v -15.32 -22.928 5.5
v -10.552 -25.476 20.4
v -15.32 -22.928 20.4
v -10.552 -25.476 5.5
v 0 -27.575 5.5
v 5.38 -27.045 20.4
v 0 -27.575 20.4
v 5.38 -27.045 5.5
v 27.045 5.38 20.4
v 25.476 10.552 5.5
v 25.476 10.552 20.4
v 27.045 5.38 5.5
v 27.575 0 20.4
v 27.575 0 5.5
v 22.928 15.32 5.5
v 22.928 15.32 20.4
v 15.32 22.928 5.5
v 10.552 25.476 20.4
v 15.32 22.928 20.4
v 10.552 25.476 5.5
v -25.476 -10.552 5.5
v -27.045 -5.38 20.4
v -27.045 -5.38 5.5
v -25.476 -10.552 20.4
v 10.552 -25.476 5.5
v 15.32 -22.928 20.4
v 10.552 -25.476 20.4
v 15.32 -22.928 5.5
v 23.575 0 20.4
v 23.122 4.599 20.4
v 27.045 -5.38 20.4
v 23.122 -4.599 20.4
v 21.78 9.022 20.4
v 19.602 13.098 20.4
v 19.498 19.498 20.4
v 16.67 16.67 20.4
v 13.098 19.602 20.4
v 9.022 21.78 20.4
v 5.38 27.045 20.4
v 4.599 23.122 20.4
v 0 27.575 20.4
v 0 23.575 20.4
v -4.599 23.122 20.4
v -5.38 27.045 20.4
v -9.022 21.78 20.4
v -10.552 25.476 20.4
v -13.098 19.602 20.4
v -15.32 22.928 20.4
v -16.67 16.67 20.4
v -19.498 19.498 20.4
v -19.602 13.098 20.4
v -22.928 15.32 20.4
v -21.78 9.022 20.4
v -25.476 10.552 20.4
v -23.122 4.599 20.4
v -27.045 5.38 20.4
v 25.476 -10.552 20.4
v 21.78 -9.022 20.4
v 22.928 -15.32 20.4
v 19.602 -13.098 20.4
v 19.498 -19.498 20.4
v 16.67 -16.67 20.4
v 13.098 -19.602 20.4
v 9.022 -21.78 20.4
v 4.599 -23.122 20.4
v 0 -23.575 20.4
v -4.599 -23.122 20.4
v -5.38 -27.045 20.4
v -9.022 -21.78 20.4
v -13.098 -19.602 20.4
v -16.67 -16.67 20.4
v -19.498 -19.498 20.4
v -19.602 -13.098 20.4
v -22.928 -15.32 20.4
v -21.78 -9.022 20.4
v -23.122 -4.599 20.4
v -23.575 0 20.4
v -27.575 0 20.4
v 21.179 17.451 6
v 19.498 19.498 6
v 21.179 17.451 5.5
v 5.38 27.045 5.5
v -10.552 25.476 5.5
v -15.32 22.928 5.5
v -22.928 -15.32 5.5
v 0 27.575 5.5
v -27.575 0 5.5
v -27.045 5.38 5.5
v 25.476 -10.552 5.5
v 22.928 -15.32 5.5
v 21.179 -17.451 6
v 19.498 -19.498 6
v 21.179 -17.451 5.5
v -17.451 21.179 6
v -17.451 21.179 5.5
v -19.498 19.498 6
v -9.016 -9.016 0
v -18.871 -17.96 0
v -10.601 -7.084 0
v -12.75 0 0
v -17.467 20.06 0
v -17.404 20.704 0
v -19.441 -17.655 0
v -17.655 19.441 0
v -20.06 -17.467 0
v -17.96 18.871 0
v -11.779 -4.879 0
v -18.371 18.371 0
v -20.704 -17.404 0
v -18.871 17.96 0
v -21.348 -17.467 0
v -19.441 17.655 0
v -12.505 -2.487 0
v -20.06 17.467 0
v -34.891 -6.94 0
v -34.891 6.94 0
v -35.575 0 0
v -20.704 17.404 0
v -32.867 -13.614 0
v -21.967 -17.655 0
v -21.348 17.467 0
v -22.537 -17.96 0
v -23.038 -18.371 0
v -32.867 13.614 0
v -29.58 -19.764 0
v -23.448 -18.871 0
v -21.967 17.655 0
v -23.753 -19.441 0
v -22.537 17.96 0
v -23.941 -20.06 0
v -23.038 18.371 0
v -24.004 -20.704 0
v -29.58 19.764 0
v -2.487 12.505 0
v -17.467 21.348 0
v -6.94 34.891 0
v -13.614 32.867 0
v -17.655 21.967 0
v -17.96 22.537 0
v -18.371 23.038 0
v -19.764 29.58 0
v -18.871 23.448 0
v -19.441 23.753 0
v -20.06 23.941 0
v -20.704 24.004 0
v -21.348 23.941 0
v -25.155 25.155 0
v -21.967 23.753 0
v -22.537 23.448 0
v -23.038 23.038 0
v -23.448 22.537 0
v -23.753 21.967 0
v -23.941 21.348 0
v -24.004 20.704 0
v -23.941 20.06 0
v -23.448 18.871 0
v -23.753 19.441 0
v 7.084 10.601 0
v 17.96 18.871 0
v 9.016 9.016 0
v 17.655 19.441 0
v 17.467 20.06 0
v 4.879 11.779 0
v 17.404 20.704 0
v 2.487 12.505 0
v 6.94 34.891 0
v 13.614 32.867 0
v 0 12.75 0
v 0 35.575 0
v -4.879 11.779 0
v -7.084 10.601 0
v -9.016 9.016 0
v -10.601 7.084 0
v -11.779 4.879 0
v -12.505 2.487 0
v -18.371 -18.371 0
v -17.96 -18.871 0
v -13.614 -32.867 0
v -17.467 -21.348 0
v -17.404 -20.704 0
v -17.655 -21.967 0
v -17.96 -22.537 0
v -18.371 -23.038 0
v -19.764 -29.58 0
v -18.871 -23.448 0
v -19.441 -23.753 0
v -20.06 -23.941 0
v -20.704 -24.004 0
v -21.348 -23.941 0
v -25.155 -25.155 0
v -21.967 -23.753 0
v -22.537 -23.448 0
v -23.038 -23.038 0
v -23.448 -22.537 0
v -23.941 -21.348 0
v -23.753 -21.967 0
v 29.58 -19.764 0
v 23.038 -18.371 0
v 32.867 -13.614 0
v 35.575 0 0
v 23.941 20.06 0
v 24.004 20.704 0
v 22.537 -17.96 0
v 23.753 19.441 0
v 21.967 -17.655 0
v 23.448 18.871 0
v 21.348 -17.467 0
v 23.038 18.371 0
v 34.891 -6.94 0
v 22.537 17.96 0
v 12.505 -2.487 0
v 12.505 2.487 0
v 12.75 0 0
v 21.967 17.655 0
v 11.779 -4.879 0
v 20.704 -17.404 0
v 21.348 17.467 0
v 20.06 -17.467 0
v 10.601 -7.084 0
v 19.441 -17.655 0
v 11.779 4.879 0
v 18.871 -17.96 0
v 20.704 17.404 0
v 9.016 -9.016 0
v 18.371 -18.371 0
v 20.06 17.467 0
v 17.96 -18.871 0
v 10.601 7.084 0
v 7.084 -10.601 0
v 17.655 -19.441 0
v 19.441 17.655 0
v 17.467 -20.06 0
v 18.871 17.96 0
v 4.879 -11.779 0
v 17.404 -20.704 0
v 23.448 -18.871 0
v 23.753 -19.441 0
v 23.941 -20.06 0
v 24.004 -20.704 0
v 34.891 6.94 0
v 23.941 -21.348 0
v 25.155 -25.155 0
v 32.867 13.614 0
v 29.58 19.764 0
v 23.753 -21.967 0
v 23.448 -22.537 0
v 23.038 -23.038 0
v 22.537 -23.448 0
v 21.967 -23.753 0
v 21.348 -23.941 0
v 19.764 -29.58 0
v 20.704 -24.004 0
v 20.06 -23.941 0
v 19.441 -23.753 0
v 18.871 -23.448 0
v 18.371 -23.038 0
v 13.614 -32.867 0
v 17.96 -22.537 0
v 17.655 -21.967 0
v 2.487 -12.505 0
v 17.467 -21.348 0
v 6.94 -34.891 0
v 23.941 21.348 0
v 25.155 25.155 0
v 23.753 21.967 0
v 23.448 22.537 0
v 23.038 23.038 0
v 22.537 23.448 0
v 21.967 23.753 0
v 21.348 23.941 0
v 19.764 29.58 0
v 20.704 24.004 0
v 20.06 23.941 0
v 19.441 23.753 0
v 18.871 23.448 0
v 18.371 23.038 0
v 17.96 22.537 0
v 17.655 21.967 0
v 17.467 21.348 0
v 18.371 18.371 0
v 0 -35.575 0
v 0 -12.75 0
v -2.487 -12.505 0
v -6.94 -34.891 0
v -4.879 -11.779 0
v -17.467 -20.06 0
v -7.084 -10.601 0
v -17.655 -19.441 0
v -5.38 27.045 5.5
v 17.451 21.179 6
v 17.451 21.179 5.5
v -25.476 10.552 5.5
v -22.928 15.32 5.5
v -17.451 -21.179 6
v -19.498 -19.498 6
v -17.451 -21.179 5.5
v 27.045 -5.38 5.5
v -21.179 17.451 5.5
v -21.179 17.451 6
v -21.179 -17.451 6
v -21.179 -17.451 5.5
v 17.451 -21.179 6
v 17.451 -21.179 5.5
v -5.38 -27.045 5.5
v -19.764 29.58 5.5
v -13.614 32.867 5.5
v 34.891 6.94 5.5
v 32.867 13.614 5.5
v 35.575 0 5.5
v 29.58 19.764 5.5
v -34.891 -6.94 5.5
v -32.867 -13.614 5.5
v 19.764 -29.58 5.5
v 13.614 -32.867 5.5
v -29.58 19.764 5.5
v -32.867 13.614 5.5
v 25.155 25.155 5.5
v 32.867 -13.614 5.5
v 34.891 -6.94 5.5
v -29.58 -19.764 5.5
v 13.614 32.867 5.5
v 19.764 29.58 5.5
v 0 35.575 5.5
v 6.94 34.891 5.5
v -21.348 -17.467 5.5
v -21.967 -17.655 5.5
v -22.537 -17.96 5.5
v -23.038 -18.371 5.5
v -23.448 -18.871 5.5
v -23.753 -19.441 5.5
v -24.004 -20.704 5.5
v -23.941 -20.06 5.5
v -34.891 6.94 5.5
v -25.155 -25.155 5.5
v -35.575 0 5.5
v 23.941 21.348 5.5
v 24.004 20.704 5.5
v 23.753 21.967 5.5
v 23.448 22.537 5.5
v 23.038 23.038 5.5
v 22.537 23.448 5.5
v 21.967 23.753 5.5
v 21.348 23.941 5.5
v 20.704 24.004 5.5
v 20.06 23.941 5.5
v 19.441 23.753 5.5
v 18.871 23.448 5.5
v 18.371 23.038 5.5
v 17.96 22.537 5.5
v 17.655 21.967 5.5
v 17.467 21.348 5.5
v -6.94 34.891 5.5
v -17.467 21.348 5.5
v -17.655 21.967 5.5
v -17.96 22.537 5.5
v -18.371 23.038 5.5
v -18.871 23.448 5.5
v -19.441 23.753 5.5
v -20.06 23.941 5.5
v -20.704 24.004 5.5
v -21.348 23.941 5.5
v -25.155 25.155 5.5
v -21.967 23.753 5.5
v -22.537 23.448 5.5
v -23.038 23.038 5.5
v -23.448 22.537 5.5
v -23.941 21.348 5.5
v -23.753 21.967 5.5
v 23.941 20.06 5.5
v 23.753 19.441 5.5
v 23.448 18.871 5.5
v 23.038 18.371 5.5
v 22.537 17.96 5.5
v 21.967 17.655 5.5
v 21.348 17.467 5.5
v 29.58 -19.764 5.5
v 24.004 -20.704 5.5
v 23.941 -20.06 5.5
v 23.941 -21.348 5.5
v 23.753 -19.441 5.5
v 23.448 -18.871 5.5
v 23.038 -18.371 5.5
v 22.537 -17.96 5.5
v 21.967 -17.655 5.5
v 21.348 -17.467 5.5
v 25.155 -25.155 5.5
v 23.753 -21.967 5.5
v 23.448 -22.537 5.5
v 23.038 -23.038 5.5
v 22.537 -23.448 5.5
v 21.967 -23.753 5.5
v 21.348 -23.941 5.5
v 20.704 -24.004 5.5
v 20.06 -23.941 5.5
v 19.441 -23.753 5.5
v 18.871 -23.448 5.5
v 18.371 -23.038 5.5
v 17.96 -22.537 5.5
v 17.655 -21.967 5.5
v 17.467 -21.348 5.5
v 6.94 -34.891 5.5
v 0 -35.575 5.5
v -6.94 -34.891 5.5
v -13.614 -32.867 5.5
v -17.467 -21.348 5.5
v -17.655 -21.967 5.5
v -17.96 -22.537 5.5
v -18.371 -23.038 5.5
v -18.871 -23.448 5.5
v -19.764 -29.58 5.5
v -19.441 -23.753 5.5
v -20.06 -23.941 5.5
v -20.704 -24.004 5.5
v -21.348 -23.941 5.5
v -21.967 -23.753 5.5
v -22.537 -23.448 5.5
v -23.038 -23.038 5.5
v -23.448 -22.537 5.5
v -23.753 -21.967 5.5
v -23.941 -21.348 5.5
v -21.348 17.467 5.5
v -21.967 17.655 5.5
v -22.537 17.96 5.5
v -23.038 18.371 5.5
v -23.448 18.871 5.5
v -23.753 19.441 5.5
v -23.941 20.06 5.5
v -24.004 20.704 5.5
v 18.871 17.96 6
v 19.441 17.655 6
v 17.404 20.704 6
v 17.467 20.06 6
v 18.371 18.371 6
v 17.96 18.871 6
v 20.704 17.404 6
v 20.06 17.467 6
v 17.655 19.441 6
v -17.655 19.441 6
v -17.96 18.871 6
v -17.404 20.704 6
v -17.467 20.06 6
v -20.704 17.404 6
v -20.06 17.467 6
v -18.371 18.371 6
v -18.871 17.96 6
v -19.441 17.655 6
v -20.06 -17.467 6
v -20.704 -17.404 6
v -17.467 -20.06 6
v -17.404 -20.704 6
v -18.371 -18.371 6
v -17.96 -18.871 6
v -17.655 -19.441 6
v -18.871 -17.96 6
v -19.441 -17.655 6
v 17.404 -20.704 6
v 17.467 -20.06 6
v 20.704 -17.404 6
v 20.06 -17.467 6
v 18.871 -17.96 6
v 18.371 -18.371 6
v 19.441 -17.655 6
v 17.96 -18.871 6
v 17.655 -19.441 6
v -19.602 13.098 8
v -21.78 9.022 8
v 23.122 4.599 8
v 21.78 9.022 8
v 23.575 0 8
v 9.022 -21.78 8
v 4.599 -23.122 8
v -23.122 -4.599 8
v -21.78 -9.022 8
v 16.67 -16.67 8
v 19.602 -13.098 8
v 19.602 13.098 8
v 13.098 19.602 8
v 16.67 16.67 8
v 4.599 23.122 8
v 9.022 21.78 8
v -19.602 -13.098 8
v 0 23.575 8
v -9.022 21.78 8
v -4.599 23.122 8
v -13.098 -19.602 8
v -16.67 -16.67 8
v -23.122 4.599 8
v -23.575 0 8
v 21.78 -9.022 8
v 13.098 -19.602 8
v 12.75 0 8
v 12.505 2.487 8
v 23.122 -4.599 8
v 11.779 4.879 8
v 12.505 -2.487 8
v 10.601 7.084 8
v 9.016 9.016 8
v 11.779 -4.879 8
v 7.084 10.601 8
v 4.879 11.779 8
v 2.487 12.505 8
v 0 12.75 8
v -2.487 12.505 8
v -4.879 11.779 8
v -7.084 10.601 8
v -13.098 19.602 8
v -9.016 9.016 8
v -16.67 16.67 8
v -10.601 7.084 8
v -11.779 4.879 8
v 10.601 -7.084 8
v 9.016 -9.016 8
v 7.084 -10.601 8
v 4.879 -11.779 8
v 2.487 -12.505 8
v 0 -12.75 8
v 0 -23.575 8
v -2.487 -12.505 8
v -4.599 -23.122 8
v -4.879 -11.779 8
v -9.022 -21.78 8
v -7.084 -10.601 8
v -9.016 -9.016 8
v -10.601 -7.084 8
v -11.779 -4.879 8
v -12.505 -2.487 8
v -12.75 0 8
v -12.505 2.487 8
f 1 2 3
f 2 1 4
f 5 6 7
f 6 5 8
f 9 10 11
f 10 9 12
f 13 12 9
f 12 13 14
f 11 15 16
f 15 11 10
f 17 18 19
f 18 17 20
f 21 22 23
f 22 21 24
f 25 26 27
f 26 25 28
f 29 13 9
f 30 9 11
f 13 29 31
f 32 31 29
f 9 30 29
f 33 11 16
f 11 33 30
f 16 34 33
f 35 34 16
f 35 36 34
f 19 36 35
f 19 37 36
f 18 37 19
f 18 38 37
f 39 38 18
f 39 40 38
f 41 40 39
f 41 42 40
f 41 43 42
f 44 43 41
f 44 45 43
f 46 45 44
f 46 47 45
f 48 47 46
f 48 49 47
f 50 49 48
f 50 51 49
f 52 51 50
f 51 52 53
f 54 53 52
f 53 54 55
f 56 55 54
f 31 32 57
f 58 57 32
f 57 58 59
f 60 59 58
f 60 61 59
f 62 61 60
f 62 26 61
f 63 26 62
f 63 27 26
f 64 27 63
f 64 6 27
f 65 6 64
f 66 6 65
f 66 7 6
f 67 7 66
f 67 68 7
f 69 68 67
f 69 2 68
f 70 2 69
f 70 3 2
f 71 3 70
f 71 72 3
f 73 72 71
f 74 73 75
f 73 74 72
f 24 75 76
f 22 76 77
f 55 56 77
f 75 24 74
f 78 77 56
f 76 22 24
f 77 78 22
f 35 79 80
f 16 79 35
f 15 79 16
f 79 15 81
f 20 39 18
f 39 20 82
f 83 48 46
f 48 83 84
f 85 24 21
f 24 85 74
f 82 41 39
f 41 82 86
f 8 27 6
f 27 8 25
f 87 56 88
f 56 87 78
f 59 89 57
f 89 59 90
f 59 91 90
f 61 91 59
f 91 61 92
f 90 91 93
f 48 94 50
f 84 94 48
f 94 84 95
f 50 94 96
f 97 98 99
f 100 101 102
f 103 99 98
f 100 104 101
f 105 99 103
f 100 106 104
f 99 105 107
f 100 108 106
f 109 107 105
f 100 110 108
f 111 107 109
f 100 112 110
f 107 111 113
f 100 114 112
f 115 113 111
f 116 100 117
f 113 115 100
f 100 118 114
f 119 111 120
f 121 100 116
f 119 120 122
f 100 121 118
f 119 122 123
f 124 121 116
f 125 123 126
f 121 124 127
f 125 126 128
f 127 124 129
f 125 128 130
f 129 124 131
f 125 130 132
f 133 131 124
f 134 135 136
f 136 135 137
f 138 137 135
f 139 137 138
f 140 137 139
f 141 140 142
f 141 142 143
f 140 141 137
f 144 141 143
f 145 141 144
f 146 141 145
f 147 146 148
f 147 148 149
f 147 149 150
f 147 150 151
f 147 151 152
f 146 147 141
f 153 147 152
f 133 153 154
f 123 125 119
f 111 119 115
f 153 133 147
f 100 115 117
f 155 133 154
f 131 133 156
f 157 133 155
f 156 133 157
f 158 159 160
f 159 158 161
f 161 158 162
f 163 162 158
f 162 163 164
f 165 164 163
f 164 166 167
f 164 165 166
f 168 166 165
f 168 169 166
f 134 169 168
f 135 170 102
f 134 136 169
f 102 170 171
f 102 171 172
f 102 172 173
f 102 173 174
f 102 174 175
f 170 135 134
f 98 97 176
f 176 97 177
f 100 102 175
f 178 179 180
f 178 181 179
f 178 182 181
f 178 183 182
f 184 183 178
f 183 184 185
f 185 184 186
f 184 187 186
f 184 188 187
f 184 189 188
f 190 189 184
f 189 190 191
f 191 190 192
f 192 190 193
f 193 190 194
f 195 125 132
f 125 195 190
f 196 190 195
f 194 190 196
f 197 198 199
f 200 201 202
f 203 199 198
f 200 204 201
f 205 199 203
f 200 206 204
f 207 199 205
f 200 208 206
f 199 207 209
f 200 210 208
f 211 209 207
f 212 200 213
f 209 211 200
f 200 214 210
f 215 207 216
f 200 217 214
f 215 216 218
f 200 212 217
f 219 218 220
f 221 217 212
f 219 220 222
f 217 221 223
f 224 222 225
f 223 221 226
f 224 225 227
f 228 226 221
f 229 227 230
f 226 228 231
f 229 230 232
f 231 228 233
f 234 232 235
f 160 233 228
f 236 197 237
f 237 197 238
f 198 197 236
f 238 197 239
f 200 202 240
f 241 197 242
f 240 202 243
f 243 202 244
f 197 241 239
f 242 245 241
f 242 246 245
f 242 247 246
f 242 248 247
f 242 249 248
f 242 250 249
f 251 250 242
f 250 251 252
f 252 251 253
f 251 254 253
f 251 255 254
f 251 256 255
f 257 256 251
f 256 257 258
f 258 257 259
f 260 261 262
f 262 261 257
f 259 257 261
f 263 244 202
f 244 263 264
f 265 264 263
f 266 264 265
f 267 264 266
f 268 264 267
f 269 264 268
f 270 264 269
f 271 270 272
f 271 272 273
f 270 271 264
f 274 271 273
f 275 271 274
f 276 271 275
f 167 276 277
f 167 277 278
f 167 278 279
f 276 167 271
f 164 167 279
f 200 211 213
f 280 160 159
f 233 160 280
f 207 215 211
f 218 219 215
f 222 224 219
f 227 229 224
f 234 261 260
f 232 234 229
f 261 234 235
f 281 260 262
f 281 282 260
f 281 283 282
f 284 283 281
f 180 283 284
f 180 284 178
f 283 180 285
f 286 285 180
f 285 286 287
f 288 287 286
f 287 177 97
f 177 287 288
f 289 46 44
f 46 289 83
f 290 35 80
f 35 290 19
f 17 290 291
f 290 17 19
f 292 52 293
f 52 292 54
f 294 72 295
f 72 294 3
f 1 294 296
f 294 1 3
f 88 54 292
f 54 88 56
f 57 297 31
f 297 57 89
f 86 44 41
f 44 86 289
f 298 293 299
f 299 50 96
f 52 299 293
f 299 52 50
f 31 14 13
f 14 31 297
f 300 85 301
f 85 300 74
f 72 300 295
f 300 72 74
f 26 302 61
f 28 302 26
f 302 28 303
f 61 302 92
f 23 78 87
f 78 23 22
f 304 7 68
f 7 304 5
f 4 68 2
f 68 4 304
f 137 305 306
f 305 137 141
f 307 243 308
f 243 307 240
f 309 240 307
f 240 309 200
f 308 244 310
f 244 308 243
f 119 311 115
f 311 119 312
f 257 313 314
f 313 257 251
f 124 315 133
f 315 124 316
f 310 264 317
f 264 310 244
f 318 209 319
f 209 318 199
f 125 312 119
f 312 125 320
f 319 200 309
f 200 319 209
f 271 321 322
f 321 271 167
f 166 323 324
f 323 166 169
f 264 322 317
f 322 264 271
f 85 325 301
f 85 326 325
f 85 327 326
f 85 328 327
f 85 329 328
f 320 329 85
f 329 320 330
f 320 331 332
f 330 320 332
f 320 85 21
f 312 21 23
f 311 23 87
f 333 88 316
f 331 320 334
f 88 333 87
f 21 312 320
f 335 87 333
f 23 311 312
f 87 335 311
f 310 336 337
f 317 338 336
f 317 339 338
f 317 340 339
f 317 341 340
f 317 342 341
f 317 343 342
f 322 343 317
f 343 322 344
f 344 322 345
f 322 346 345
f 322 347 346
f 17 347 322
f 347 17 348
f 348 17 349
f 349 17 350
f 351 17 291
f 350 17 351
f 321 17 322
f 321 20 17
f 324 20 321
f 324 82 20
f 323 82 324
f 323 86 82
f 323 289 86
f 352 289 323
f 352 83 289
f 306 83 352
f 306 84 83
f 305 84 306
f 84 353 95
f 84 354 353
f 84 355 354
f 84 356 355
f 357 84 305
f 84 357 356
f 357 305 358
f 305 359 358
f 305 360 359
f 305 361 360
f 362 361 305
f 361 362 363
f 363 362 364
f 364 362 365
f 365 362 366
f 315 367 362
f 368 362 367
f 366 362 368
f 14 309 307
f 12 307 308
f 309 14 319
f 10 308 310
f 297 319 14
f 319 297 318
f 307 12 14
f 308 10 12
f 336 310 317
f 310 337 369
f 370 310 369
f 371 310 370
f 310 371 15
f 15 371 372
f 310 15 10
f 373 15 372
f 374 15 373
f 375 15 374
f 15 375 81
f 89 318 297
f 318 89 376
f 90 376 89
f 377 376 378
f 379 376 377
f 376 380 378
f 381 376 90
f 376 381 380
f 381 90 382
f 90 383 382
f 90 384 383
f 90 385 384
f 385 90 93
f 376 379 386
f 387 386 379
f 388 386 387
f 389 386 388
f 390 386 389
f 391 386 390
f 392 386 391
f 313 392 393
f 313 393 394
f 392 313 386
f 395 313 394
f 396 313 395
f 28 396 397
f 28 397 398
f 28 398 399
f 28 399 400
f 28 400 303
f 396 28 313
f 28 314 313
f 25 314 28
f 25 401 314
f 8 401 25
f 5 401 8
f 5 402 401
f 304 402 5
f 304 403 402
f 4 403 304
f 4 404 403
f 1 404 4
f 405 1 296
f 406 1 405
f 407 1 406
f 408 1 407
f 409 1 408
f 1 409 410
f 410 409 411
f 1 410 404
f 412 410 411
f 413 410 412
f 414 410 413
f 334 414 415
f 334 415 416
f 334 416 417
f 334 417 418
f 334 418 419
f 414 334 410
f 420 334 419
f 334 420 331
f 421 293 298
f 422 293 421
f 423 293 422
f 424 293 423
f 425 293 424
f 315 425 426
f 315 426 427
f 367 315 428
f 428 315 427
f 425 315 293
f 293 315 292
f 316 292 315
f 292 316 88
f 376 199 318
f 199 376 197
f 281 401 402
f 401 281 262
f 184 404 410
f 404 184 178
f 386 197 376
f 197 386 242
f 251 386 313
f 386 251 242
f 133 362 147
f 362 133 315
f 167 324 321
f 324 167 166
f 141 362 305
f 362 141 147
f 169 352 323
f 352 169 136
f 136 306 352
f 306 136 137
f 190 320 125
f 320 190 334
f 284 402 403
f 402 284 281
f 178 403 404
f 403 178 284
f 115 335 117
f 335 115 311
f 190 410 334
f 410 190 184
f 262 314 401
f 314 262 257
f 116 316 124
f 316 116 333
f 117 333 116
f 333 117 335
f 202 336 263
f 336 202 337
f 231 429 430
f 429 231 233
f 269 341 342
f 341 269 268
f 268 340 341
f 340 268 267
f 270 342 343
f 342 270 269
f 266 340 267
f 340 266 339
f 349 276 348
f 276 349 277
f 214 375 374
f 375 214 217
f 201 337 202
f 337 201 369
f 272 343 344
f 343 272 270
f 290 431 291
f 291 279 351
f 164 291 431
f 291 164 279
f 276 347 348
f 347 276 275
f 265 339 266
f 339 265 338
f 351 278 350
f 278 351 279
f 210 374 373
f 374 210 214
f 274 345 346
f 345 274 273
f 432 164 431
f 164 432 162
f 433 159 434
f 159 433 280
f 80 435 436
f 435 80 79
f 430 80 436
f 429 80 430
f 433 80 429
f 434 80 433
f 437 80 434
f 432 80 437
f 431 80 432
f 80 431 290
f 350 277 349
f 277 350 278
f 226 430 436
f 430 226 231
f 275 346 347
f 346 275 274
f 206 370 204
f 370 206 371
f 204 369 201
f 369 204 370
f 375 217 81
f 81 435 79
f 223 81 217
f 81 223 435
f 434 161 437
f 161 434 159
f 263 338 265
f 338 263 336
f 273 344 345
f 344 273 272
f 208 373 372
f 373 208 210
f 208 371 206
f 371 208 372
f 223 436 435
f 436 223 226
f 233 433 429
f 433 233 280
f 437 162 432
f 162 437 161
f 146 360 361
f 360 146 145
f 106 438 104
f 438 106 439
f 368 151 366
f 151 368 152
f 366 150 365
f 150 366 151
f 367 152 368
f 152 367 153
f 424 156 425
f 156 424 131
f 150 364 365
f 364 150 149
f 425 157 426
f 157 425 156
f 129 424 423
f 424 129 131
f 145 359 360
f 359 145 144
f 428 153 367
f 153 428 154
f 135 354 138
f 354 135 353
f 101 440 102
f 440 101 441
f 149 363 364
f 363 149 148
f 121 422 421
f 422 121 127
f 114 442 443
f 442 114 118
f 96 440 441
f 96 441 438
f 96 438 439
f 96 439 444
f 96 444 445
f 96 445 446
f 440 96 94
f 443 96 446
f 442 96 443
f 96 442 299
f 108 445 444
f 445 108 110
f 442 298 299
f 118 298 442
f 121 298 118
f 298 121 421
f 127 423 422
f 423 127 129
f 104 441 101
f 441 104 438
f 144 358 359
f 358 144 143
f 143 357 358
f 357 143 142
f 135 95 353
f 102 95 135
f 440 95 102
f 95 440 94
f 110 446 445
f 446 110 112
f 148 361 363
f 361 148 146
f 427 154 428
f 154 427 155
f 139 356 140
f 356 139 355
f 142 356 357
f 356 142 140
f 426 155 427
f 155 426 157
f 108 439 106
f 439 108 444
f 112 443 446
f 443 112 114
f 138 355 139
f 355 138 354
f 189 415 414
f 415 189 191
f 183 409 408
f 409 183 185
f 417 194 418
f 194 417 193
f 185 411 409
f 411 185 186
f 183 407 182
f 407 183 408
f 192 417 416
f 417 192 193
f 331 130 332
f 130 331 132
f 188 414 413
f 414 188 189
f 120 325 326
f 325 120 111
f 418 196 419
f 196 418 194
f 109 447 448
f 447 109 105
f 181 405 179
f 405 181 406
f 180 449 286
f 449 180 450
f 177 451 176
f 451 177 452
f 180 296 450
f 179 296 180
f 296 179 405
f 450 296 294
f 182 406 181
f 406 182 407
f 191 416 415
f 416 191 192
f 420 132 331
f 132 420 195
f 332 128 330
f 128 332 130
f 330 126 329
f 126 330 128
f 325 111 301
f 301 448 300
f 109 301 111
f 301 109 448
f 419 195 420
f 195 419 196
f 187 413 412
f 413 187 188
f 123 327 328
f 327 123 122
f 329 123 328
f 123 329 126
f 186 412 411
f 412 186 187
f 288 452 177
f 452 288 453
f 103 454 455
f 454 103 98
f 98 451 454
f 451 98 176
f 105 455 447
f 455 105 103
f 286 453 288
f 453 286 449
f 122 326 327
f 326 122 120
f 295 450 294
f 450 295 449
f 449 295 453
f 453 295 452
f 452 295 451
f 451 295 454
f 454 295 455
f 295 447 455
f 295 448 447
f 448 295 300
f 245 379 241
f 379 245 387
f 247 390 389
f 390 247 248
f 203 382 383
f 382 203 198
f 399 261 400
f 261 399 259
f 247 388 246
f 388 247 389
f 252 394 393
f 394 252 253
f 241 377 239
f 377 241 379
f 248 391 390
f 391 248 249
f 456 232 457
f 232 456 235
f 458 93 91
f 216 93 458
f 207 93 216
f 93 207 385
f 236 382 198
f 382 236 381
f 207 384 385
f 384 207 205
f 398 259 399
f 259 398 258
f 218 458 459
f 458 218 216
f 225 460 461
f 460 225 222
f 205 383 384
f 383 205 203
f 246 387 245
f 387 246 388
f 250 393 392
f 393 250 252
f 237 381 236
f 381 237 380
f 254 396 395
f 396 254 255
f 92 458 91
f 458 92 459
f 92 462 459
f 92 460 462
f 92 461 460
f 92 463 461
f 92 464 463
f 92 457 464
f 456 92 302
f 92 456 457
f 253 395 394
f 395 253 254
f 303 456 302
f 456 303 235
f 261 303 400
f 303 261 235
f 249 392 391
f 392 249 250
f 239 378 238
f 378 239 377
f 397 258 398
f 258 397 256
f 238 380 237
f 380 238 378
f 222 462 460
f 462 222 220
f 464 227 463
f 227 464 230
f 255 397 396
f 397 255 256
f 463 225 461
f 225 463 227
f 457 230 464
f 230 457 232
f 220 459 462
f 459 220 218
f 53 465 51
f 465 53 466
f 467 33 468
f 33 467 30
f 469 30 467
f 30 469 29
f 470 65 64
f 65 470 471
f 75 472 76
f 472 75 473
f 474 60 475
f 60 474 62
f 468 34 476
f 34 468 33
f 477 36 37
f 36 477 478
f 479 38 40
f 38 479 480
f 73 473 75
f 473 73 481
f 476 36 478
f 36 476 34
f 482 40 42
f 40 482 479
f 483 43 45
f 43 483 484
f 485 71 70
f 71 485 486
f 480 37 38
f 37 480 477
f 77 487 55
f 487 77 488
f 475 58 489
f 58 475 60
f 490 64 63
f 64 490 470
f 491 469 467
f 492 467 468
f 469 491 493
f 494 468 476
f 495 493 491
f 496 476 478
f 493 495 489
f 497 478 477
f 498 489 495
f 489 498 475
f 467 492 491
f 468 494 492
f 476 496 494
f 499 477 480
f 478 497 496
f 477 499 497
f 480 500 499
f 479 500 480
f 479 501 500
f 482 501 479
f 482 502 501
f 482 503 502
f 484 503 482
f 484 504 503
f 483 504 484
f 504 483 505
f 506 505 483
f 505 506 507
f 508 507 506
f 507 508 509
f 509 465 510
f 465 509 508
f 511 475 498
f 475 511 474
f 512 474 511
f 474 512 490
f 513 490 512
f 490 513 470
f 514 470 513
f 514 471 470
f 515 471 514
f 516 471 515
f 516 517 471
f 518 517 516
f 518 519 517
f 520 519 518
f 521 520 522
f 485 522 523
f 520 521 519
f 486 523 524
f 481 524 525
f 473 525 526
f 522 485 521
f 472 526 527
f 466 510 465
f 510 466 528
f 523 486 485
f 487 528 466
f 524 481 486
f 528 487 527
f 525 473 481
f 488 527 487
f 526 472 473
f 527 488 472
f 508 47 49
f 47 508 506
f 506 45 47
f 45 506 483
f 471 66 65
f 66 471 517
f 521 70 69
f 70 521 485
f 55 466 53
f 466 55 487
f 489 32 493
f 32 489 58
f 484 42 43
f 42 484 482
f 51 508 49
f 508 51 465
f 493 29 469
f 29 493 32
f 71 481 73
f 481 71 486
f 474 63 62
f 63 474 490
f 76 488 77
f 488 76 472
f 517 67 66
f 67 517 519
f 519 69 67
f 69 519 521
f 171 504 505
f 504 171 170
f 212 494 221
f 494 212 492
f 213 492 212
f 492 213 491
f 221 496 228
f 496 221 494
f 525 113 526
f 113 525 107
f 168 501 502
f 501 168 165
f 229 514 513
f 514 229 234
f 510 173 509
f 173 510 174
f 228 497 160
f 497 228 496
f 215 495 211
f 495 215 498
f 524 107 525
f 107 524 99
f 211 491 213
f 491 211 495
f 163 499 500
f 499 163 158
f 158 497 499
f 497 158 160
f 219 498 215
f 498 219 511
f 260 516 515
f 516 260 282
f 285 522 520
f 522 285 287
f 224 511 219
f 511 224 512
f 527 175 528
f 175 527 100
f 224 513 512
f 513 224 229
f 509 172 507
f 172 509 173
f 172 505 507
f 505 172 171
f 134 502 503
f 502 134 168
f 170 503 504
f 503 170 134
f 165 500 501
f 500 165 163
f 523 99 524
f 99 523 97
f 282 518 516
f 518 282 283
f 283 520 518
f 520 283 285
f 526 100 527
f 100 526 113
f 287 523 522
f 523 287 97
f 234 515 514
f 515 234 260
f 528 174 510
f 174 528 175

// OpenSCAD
$fn = 32;

// ----------------------------------------------------------------------
// Bearing housing: seat for 6005 (47 x 12 mm), 55.15 mm body
// ----------------------------------------------------------------------

// --- parameters (mm) ---
body_od = 55.15;          // housing outside diameter
body_h = 20.4;            // overall housing height
wall = 4;                 // wall thickness
pocket_d = 47.15;         // 6005 seat, 0.15 mm clearance
seat_h = 12.4;            // pocket depth
shoulder = 4;             // shoulder under the bearing
pass_d = 25.5;            // shaft passage
flange_dia = 71.15;       // mounting flange diameter
flange_t = 4;             // flange thickness
bolt_d = 6.6;             // flange bolt clearance
bolt_r = 29.28;           // flange bolt circle radius

module body() {
  cylinder(h = body_h, d = body_od);
}

module flange() {
  /* flange sunk 1.5 mm into the body */
  cylinder(h = flange_t + 1.5, d = flange_dia);
}

difference() {
  union() {
    body();
    flange();
  }
  translate([0, 0, body_h - seat_h]) cylinder(h = seat_h + 1, d = pocket_d);
  translate([0, 0, -1]) cylinder(h = body_h - seat_h + 1, d = pass_d);
  for (i = [0 : 3]) rotate([0, 0, 45 + i * 90]) translate([bolt_r, 0, -1])
    cylinder(h = flange_t + 3, d = bolt_d);
}
